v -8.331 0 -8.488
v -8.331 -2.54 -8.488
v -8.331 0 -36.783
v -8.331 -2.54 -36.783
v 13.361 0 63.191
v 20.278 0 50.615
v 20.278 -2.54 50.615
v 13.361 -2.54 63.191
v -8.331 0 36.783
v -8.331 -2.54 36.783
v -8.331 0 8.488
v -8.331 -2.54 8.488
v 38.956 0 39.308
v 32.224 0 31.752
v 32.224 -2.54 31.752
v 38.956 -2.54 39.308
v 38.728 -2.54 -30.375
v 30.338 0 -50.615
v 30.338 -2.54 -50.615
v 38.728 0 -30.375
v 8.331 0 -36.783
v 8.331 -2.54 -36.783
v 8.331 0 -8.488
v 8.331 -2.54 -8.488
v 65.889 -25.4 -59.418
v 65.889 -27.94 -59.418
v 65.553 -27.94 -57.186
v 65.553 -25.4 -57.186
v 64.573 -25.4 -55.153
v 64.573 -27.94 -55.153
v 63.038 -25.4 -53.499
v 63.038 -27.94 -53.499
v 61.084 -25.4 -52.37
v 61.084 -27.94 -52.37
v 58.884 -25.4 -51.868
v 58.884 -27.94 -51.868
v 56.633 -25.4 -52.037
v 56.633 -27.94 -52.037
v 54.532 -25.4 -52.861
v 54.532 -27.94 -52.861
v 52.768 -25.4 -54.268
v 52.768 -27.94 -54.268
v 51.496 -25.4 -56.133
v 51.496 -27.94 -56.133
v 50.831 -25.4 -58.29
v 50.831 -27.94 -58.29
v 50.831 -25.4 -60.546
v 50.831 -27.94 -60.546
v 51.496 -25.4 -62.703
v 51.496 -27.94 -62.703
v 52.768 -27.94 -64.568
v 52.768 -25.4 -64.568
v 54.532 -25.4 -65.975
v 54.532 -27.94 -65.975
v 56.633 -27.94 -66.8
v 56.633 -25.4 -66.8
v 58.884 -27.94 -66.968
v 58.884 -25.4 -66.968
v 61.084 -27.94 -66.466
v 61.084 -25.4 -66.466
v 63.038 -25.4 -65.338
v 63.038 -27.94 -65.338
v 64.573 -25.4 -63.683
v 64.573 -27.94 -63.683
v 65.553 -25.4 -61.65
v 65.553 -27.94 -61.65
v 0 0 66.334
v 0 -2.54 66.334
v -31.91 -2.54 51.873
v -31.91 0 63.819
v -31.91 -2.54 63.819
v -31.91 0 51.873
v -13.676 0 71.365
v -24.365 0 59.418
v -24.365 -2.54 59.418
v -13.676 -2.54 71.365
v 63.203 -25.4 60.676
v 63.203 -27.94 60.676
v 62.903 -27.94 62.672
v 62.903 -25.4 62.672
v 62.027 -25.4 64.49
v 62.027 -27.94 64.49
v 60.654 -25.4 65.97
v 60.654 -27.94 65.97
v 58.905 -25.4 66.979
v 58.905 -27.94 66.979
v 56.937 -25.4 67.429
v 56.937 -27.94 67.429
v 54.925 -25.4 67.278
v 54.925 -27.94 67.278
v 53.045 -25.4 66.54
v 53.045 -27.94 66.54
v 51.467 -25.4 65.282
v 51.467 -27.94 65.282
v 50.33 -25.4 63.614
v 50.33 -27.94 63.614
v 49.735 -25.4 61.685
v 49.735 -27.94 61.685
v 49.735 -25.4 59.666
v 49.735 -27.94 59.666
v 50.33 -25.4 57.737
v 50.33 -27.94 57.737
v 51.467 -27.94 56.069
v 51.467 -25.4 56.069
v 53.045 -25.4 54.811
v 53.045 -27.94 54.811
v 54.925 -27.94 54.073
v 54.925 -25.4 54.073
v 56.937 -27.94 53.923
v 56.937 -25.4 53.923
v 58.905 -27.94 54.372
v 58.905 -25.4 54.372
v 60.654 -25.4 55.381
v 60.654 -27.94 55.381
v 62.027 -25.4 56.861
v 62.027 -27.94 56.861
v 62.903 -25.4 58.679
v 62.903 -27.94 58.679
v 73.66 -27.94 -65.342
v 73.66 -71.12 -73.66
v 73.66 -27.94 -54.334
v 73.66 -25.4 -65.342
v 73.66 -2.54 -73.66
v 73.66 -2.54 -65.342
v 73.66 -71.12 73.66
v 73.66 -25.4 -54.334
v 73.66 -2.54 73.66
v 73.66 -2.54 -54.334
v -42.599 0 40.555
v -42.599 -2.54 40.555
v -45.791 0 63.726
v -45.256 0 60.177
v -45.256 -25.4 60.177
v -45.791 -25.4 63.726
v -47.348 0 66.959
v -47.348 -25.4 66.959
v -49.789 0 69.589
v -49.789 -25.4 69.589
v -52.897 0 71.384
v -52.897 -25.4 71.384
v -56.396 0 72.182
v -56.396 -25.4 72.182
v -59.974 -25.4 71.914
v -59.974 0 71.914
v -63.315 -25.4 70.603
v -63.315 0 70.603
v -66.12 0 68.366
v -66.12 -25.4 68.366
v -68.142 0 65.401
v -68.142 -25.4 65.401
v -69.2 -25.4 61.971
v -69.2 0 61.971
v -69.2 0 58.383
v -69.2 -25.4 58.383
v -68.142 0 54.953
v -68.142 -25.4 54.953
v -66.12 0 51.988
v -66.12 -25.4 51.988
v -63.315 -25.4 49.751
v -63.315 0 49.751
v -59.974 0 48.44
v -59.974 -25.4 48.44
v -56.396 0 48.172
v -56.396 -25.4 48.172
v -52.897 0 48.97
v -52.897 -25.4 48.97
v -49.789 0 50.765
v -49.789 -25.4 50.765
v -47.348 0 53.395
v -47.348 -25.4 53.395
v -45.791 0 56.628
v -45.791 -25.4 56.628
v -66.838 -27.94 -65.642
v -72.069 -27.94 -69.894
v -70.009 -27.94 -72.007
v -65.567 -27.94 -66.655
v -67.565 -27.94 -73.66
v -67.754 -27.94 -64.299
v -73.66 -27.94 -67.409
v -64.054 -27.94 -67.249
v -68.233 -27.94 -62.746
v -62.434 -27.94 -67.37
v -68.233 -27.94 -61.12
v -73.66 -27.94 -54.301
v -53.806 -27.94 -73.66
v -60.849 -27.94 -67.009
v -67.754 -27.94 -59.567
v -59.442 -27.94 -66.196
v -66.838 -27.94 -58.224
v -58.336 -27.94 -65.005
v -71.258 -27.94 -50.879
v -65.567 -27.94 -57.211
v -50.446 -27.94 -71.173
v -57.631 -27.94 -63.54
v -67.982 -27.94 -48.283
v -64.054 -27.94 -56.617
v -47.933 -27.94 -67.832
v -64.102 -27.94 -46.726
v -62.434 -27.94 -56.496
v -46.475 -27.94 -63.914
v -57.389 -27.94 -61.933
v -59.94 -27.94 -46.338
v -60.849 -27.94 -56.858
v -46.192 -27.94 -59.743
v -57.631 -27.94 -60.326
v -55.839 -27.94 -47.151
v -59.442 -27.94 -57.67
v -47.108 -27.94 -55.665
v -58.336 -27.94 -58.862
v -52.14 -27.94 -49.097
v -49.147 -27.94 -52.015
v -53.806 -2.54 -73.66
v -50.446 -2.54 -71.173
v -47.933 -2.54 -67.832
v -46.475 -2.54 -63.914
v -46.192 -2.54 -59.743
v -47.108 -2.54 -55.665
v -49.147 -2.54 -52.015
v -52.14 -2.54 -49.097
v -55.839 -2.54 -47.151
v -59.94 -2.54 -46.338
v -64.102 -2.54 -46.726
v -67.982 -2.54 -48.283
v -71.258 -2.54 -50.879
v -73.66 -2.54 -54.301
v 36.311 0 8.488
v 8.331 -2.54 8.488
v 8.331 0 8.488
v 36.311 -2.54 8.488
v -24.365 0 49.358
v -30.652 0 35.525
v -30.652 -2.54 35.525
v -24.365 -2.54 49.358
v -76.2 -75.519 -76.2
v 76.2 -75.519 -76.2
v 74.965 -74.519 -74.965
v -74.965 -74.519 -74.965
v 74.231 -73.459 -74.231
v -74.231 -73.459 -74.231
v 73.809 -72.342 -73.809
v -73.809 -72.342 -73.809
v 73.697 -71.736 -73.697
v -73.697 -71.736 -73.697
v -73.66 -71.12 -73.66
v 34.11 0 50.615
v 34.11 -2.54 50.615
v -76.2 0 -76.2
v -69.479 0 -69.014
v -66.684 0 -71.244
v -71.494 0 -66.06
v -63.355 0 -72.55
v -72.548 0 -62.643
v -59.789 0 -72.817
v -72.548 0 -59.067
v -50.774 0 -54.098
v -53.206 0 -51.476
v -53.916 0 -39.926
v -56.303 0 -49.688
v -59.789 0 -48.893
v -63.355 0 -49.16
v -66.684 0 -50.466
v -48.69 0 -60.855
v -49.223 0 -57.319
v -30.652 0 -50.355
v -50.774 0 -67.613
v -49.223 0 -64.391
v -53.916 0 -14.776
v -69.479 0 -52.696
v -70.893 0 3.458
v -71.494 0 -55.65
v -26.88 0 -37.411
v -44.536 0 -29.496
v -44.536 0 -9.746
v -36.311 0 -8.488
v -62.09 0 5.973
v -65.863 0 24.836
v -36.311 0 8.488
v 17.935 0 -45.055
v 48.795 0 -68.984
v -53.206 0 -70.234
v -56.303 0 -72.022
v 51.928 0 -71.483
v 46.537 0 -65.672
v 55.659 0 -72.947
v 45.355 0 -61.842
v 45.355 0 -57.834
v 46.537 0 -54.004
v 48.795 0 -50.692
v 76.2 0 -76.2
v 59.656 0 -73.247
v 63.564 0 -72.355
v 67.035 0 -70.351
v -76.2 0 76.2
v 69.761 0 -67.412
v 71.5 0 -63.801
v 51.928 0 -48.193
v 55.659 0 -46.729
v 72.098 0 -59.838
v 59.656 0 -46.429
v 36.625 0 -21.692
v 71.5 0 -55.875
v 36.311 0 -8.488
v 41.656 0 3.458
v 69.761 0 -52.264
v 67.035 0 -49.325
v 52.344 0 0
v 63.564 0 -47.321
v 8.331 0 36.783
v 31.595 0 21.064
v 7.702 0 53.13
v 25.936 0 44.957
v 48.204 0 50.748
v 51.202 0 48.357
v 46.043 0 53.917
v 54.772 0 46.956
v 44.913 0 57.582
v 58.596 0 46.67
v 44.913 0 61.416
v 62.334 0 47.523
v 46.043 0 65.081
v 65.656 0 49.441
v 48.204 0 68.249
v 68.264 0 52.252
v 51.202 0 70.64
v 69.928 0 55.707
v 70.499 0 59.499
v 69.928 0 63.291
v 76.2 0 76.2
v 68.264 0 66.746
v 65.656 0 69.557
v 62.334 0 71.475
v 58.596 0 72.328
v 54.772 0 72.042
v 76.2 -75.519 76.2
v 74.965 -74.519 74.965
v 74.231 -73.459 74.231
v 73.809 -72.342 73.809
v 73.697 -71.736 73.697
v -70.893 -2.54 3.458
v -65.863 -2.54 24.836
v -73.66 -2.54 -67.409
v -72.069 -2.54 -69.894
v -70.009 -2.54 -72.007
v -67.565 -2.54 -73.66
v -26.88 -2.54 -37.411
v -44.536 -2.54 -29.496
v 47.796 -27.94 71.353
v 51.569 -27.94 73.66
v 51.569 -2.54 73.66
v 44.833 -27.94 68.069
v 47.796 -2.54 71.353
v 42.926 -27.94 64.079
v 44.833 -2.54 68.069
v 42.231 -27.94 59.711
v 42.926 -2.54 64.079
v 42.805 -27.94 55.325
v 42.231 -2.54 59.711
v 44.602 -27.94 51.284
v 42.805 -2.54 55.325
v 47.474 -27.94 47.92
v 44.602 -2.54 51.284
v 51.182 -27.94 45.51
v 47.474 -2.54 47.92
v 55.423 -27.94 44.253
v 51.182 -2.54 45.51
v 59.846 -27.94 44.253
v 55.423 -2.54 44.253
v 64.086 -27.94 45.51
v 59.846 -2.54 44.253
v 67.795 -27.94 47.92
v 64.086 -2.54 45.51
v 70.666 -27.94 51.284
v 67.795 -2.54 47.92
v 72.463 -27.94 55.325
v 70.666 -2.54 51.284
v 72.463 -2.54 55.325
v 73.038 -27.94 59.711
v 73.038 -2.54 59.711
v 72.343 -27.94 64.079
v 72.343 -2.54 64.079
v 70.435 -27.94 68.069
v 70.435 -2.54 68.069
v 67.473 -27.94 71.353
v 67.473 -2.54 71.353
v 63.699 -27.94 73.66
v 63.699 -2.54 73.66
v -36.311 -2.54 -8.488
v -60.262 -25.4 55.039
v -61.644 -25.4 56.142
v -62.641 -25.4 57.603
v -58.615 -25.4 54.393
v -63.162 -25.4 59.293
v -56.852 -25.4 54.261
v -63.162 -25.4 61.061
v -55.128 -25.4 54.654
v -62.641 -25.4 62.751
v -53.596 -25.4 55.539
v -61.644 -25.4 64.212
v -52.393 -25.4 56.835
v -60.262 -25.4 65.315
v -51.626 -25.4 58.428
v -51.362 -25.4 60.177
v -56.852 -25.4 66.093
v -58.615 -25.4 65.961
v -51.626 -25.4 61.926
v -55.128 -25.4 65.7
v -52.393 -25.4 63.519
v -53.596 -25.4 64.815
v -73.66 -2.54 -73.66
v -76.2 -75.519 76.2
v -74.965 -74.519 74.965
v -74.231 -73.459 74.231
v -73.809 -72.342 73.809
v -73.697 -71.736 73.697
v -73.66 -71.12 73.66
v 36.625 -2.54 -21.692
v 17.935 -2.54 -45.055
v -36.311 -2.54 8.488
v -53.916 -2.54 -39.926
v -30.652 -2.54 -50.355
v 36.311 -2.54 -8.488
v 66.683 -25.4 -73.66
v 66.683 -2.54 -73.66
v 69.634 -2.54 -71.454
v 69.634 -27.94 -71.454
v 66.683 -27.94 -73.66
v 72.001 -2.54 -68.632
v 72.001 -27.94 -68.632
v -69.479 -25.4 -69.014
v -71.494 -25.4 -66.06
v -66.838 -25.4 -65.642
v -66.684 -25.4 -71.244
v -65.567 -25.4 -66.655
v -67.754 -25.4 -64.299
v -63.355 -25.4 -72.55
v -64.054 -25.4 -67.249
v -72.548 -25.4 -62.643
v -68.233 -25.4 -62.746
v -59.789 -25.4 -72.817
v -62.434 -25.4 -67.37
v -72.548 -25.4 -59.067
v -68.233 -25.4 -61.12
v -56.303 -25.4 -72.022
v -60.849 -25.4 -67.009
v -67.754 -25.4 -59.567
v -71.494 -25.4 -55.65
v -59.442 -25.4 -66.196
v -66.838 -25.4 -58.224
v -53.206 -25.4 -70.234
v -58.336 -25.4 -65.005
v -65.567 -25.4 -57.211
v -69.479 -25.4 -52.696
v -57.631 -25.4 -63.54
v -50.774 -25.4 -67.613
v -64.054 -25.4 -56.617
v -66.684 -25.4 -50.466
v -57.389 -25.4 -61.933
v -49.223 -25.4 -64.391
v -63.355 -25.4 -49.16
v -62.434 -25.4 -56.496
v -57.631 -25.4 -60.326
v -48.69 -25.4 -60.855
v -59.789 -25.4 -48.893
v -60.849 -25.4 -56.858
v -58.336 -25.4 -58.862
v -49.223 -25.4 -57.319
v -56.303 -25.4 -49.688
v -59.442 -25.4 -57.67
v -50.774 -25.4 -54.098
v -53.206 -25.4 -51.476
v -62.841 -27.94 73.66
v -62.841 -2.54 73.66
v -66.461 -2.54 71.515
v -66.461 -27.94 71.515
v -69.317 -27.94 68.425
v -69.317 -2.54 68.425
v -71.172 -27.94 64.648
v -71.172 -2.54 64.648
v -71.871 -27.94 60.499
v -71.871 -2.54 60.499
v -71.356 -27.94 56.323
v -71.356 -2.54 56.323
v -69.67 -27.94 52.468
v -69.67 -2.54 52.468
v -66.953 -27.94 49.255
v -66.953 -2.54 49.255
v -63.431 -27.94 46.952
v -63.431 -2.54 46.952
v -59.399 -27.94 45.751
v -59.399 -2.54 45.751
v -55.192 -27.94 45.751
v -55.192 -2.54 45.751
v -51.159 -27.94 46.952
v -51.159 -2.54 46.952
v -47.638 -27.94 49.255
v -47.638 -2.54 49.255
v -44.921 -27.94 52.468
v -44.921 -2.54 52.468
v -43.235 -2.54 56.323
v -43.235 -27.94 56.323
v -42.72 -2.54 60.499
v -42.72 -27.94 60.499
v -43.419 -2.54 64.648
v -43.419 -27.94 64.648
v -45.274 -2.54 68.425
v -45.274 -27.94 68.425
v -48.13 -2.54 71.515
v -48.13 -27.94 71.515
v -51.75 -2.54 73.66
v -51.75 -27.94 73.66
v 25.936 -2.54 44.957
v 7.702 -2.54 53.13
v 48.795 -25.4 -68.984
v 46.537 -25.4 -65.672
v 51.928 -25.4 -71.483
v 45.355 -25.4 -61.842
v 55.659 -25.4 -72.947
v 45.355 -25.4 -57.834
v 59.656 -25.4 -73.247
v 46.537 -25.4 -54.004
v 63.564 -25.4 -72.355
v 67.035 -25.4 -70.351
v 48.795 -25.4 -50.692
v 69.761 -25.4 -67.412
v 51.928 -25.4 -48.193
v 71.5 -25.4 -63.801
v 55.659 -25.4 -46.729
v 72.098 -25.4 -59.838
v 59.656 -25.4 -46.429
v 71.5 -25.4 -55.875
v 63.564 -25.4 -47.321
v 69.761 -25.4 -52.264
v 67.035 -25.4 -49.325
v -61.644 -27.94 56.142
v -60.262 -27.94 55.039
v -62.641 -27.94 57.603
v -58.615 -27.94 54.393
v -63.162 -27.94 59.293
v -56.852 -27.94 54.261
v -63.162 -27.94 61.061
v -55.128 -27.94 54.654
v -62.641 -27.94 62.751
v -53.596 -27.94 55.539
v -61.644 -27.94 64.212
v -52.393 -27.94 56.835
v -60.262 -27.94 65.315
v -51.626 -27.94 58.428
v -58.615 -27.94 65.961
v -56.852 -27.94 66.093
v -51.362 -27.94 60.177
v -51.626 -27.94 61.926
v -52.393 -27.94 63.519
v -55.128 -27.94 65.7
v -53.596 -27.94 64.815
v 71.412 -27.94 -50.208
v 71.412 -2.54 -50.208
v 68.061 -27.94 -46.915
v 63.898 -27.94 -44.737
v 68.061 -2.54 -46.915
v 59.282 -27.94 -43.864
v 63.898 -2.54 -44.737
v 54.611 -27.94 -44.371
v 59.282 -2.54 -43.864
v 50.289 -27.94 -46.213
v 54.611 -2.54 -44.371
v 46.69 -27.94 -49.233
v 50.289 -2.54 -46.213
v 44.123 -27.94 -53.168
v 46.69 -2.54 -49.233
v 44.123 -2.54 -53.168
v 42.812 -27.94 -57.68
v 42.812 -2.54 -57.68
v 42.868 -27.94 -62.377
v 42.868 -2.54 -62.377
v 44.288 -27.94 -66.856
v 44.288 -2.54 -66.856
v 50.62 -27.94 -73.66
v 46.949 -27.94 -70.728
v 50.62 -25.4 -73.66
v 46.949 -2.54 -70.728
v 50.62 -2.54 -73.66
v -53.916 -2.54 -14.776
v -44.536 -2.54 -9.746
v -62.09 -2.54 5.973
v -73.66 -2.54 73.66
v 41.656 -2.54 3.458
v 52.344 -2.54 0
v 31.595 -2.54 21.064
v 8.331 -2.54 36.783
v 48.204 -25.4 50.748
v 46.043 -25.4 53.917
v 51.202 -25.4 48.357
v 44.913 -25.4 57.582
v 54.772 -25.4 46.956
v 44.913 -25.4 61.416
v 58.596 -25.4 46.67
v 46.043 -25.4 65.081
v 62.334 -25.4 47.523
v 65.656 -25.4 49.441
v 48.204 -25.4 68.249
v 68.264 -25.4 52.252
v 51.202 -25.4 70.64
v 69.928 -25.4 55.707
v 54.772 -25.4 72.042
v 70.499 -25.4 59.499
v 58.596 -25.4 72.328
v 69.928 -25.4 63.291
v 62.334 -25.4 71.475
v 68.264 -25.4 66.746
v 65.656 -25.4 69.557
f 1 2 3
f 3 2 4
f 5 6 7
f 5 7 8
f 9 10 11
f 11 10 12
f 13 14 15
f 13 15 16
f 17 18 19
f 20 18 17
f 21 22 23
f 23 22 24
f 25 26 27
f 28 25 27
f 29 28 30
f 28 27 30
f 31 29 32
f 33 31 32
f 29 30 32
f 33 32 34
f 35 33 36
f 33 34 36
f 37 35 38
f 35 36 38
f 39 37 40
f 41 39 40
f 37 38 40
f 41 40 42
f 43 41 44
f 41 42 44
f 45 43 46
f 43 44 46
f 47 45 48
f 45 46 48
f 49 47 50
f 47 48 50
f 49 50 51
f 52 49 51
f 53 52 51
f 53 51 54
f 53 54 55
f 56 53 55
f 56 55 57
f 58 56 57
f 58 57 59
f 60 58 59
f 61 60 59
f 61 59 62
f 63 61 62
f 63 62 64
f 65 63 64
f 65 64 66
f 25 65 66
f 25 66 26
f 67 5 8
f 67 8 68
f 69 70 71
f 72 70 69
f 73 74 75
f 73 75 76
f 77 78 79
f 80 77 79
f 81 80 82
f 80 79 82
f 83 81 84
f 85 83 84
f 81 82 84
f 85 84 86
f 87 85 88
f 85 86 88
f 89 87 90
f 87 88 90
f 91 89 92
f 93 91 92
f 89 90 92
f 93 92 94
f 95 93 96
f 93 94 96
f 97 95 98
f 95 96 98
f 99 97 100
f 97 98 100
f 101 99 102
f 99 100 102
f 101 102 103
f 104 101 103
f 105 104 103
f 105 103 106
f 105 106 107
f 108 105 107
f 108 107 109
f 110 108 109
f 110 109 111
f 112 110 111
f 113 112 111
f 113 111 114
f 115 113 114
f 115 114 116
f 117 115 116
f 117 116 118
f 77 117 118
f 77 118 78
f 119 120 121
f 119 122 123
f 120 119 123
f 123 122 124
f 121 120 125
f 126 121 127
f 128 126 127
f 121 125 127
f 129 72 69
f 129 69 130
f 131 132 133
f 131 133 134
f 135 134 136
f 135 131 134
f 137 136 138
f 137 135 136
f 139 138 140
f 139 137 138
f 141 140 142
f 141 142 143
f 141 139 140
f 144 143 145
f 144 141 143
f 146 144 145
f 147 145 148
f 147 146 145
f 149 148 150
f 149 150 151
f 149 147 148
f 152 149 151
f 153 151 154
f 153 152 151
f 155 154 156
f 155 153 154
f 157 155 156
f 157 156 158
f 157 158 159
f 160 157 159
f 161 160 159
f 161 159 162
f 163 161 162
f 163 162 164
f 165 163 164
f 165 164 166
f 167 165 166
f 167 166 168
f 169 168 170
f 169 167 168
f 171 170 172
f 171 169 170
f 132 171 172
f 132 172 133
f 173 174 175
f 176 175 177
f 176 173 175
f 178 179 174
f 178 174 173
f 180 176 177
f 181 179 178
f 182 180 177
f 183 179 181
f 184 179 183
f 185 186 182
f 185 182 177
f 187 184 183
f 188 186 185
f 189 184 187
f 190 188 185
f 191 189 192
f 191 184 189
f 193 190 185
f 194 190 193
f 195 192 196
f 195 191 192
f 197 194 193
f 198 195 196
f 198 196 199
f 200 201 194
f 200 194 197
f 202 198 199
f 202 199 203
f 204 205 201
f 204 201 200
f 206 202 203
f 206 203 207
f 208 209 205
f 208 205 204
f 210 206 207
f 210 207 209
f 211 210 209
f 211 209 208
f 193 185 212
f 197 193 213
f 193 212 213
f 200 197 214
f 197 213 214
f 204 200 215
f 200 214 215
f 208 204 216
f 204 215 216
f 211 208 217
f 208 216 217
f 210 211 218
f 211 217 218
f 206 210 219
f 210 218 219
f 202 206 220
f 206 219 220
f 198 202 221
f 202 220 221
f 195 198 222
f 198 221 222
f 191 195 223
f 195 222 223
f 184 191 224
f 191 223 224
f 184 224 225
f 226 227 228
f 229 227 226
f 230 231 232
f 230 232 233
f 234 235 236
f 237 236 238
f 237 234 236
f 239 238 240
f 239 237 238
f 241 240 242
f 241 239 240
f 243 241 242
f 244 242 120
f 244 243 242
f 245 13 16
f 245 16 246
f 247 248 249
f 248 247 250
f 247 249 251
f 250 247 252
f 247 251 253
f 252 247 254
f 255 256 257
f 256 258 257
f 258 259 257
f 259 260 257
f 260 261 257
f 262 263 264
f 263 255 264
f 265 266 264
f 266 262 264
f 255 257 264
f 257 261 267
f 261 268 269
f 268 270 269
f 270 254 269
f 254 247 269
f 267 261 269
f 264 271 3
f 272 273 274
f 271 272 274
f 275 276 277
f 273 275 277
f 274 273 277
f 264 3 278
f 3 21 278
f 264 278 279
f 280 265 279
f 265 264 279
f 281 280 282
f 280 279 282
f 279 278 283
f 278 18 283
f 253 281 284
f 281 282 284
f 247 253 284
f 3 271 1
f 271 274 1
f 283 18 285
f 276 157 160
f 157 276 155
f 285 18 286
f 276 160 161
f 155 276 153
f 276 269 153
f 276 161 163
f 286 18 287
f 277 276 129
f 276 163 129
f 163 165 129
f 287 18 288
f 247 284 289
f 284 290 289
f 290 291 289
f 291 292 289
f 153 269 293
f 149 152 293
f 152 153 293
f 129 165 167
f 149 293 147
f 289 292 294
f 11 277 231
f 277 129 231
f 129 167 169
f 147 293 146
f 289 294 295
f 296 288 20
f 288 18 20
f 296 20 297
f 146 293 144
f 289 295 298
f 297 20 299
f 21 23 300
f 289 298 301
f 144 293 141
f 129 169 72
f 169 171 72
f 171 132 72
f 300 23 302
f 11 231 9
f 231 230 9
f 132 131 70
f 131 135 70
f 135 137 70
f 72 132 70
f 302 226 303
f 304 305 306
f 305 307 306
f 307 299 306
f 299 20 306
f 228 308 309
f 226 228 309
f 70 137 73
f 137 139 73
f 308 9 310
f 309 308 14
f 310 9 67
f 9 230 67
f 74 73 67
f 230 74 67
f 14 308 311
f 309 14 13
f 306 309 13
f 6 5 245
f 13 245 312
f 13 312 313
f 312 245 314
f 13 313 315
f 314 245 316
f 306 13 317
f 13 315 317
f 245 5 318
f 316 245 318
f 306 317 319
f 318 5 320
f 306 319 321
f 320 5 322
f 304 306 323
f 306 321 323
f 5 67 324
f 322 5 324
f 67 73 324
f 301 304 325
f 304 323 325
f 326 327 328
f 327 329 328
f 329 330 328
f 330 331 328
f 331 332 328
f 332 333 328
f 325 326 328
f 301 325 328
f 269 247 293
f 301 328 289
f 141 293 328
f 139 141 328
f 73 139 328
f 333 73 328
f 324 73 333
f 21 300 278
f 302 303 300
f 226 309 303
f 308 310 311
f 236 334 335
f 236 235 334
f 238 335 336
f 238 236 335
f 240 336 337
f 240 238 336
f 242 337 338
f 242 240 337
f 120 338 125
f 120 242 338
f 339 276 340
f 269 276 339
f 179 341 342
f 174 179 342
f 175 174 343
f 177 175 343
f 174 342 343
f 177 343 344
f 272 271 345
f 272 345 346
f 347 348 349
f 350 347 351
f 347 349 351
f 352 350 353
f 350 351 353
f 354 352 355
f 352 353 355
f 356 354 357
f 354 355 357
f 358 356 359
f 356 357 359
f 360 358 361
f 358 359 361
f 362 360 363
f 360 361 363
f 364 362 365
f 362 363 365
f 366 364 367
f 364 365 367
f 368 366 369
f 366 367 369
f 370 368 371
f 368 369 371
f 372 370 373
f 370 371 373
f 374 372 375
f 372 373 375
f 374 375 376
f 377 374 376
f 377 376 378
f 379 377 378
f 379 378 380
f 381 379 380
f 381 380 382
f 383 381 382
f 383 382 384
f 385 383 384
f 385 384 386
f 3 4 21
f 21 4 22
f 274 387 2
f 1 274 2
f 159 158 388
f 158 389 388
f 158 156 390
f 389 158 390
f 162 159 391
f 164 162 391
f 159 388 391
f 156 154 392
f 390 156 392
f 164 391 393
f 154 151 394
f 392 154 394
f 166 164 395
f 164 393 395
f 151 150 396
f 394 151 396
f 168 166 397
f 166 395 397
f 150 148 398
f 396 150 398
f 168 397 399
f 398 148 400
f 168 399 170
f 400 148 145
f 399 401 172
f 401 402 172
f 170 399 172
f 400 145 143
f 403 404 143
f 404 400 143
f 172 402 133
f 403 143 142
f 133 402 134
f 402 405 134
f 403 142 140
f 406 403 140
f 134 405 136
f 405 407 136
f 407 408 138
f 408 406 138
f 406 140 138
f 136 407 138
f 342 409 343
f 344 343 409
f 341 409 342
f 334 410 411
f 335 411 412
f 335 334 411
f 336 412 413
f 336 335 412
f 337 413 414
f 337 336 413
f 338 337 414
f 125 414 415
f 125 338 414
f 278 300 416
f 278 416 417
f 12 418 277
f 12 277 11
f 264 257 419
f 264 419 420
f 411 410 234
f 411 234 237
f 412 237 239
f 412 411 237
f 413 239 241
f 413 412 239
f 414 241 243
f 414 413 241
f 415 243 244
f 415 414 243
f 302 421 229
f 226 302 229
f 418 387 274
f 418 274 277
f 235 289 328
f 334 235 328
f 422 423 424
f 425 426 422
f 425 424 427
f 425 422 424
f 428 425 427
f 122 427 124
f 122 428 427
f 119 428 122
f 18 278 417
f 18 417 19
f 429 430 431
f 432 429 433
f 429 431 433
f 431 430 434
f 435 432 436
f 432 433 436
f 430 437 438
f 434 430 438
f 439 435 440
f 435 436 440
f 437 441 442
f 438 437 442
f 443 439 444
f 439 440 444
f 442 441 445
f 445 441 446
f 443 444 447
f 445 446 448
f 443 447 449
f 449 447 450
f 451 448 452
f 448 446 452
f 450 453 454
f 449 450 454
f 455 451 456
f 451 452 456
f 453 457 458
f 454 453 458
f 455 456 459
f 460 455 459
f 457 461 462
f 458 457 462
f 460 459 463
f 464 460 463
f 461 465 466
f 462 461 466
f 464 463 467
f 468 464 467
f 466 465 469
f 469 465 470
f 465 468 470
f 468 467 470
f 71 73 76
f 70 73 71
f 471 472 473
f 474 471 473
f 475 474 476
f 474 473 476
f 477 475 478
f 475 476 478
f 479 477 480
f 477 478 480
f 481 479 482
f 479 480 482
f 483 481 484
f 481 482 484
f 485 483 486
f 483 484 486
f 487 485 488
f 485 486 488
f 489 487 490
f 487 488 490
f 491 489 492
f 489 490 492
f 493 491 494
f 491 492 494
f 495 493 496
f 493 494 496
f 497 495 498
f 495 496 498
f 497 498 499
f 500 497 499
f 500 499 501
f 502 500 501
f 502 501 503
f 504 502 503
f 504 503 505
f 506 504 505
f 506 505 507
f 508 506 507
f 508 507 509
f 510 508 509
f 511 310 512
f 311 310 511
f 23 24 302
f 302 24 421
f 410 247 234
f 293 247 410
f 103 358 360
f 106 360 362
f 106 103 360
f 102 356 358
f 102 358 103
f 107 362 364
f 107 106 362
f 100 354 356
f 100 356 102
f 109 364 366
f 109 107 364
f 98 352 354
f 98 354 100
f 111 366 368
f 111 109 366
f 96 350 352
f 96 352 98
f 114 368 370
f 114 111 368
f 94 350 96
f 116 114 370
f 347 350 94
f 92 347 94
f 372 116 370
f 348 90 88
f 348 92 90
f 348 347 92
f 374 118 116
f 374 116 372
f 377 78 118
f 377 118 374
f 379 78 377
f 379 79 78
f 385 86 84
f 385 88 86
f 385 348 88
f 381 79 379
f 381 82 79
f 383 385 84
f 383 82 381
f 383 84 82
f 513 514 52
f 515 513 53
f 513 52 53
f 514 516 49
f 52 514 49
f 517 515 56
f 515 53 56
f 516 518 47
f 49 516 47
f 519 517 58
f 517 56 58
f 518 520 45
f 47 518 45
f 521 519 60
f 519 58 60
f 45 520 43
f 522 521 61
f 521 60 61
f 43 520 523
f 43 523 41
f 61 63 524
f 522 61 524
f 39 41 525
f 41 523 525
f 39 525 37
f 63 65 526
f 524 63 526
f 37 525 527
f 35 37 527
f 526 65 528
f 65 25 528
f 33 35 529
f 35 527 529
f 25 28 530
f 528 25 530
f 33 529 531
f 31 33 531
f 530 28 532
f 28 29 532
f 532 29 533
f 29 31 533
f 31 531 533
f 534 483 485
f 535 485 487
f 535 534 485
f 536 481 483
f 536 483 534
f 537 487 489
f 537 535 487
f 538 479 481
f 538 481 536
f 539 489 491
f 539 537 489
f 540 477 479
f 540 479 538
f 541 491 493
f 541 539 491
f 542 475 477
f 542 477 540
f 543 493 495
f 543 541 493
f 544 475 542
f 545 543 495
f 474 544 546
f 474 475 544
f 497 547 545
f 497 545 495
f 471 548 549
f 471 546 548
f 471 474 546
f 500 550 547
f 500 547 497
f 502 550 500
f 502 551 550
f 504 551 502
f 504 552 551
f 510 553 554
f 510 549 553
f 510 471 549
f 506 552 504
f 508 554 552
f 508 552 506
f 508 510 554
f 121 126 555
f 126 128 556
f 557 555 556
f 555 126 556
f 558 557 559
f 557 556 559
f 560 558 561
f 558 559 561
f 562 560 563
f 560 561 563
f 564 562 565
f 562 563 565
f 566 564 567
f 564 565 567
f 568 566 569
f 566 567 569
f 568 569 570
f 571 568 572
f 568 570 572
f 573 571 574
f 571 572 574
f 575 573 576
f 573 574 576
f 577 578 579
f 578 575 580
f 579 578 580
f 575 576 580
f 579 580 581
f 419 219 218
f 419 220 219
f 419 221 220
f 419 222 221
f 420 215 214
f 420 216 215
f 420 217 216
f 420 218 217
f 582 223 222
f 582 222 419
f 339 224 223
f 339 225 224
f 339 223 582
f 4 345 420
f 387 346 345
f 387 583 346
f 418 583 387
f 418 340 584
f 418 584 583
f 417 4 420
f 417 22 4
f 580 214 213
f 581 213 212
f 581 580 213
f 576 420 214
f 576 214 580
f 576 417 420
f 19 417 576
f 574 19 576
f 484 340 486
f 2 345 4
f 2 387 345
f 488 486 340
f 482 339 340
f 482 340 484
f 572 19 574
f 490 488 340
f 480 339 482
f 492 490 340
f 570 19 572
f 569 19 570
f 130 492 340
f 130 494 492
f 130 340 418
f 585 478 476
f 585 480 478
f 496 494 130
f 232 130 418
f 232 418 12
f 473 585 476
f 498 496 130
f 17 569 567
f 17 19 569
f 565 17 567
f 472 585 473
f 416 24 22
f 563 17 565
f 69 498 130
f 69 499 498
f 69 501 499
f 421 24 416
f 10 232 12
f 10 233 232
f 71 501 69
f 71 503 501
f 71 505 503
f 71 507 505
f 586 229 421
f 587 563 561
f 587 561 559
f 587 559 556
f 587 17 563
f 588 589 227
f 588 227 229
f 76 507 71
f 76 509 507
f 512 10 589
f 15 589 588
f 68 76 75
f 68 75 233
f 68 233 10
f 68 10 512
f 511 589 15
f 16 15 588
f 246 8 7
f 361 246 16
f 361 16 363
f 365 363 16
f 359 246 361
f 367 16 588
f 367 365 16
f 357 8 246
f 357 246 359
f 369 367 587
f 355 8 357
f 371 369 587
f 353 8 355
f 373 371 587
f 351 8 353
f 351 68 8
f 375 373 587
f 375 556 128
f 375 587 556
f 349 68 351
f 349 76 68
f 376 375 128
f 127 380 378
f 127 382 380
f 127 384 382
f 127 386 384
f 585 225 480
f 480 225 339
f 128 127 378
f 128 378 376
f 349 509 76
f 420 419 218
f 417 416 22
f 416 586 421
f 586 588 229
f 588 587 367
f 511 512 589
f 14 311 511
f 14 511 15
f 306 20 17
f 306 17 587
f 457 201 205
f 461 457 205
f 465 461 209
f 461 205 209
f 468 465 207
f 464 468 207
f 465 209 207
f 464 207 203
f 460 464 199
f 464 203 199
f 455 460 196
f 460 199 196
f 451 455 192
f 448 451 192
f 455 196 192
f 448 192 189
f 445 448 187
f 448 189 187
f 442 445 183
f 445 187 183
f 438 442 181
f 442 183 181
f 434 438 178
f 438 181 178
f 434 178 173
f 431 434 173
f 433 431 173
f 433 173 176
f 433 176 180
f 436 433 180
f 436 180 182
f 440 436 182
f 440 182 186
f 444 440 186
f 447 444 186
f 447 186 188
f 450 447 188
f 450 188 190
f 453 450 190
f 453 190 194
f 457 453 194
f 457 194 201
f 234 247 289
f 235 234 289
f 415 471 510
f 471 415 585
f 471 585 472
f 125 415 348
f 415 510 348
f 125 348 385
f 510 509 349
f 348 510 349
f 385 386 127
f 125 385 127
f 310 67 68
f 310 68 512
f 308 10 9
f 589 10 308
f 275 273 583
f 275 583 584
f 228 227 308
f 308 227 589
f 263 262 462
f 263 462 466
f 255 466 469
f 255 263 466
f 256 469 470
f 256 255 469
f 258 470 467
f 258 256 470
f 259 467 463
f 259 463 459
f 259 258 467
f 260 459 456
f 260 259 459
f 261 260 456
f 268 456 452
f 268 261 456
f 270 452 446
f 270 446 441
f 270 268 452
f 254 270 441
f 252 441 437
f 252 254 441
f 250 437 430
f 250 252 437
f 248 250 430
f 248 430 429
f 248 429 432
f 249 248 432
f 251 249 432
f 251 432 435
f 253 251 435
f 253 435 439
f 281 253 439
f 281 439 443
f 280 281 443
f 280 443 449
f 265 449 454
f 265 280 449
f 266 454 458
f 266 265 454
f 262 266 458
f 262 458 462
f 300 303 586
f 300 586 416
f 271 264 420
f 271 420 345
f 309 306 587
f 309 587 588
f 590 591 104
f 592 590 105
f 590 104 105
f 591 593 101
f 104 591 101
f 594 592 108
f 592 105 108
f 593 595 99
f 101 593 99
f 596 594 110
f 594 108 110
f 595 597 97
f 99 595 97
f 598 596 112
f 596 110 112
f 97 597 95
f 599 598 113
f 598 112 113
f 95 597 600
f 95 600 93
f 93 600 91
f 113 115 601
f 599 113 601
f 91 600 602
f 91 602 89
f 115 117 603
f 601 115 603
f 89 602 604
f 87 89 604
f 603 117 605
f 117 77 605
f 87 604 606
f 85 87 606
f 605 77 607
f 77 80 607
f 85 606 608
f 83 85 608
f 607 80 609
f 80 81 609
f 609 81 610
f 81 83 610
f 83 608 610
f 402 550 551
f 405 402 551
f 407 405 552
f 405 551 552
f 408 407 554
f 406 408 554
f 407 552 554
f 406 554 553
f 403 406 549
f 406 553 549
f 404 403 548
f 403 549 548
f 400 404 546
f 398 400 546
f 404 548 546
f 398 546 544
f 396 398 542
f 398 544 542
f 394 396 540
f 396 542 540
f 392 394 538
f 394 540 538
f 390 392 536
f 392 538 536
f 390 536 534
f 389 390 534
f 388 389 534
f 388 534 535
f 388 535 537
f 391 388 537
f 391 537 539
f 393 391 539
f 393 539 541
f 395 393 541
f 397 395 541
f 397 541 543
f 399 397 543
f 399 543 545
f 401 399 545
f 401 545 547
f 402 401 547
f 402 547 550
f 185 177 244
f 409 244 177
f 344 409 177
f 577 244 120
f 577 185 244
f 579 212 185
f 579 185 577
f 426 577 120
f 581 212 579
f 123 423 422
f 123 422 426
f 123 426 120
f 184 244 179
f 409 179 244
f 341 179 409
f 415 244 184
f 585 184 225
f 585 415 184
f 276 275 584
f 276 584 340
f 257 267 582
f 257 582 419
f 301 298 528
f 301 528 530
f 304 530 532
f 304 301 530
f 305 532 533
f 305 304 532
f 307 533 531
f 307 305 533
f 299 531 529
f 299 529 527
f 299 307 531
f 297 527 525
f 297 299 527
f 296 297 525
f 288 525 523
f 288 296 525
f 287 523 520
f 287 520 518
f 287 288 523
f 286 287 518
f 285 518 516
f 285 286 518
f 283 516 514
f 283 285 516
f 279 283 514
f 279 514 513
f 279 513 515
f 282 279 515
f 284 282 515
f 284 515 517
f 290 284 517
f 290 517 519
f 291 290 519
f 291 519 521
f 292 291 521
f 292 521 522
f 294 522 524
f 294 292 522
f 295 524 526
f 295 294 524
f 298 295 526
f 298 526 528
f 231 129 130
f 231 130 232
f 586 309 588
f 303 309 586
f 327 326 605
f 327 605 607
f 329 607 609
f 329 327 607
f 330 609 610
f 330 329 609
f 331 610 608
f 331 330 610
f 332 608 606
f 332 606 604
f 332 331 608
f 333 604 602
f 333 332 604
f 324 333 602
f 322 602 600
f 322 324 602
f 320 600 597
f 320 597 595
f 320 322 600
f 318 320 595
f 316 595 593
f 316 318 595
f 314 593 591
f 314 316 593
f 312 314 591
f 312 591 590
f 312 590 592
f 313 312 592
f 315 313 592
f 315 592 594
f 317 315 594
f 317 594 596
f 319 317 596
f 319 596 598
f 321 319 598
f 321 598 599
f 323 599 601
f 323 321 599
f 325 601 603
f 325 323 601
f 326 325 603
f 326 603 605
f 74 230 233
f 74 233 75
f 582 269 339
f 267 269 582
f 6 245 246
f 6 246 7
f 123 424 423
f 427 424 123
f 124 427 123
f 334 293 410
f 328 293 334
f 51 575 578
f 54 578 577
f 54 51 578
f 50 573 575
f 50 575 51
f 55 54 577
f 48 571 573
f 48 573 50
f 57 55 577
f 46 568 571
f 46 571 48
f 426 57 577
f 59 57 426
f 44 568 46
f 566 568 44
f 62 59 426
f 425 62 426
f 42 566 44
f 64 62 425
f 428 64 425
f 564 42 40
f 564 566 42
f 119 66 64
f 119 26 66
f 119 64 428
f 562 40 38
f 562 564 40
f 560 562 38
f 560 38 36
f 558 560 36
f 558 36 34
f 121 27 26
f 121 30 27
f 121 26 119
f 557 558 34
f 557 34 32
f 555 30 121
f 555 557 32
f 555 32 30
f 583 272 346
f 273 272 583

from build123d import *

# Parameters (mm, degrees)
F0_W         = 152.4
F0_H         = 152.4
F1_DEPTH     = 76.2
F2_R         = 12.8651099241
F2_R_2       = 12.0389782125
F2_R_3       = 13.4461105648
F2_R_4       = 11.9959461494
F3_DEPTH     = 25.4
F4_T         = 2.54
F5_T1_DEPTH  = 147.32
F5_T3_DEPTH  = 147.32
F5_T9_DEPTH  = 160.02
F5_T15_DEPTH = 160.02
F5_T24_DEPTH = 160.02
F5_T30_DEPTH = 160.02
F5_T39_DEPTH = 160.02
F5_T45_DEPTH = 160.02
F5_T54_DEPTH = 160.02
F5_T60_DEPTH = 160.02
F6_W         = 16.6622009128
F6_H         = 28.2943053171
F6_H_2       = 16.9765818864
F6_W_2       = 27.9799224809
F7_DEPTH     = 25.4
F8_R         = 5.4524649891
F8_R_2       = 5.9328095345
F8_R_3       = 6.7719768786
F8_R_4       = 7.5712998573
F9_DEPTH     = 25.4
F11_DEPTH    = 25.4


# Not quite as in the source:
# - a fillet or chamfer that OpenCascade refuses, or shapes differently, is made with other operations: its cross-section is extruded or revolved along the edge and cut away or added
# - a shell that OpenCascade refuses in one call is made with other operations: the cavity is built on its own and cut out


with BuildPart() as f1:
    # F0 (on Front) → F1 (new body)
    with BuildSketch(Plane.XZ):
        Rectangle(F0_W, F0_H)
    extrude(amount=F1_DEPTH)

    # F2 (on face) → F3 (cut)
    with BuildSketch(Plane.XZ):
        with Locations((57.6343238354, 59.4989620149)):
            Circle(F2_R)
        with Locations((-57.2953000665, 60.177013278)):
            Circle(F2_R_2)
        with Locations((58.6513988674, -59.8379895091)):
            Circle(F2_R_3)
        with Locations((-60.6855526567, -60.8550645411)):
            Circle(F2_R_4)
    extrude(amount=F3_DEPTH, mode=Mode.SUBTRACT)

    # F4: shell of thickness 2.54, made by hand


with BuildPart() as f4_core1:
    # F4_t2: copy of F1
    add(f1.part)

    # the walls: a layer under each face that stays
    f4_faces = [f4_core1.faces().sort_by_distance(p)[0] for p in [
        (0, -38.1, 76.2),
        (76.2, -38.1, 0),
        (-76.2, -38.1, 0),
        (0, 0, 0),
        (0, -38.1, -76.2),
        (-72.681498806, -12.7, -60.8550645411),
        (45.2052883026, -12.7, -59.8379895091),
        (-69.334278279, -12.7, 60.177013278),
        (44.7692139113, -12.7, 59.4989620149),
        (-60.6855526567, -25.4, -60.8550645411),
        (58.6513988674, -25.4, -59.8379895091),
        (-57.2953000665, -25.4, 60.177013278),
        (57.6343238354, -25.4, 59.4989620149),
    ]]
    thicken(f4_faces, amount=-F4_T, mode=Mode.SUBTRACT)

    # F4_s3 → F4_t4 (revolve, cut)
    with BuildSketch(Plane.XY.offset(-60.8550645411)):
        Polygon((-48.7150065073, -25.3746), (-46.1496065073, -25.4), (-46.1496065073, -27.94), (-48.6896065073, -27.94), align=None)
    revolve(axis=Axis((-60.6855526567, -25.4, -60.8550645411), (0, -1, 0)), mode=Mode.SUBTRACT)

    # F4_s5 → F4_t6 (revolve, cut)
    with BuildSketch(Plane.XY.offset(-59.8379895091)):
        Polygon((72.0721094321, -25.3746), (74.6375094321, -25.4), (74.6375094321, -27.94), (72.0975094321, -27.94), align=None)
    revolve(axis=Axis((58.6513988674, -25.4, -59.8379895091), (0, -1, 0)), mode=Mode.SUBTRACT)

    # F4_s7 → F4_t8 (revolve, cut)
    with BuildSketch(Plane.XY.offset(60.177013278)):
        Polygon((-45.281721854, -25.3746), (-42.716321854, -25.4), (-42.716321854, -27.94), (-45.256321854, -27.94), align=None)
    revolve(axis=Axis((-57.2953000665, -25.4, 60.177013278), (0, -1, 0)), mode=Mode.SUBTRACT)

    # F4_s9 → F4_t10 (revolve, cut)
    with BuildSketch(Plane.XY.offset(59.4989620149)):
        Polygon((70.4740337595, -25.3746), (73.0394337595, -25.4), (73.0394337595, -27.94), (70.4994337595, -27.94), align=None)
    revolve(axis=Axis((57.6343238354, -25.4, 59.4989620149), (0, -1, 0)), mode=Mode.SUBTRACT)


with BuildPart() as f1_1:
    add(f1.part)

    # what is left inside the walls is the cavity
    f4_cavity = [f4_core1.part.solids().sort_by_distance(p)[0] for p in [
        (0, -76.1746, -24.553333),
    ]]
    add(f4_cavity, mode=Mode.SUBTRACT)

    # F5: fillet of radius 5.08 on 4 edges, made by hand

    # F5_s2 → F5_t1 (cut)
    with BuildSketch(Plane.YZ.offset(-73.66)):
        with BuildLine():
            ThreePointArc((-76.2, 78.74), (-74.7121024484, 75.1478975516), (-71.12, 73.66))
            Line((-71.12, 73.66), (-76.2, 73.66))
            Line((-76.2, 73.66), (-76.2, 78.74))
        make_face()
        with BuildLine():
            ThreePointArc((-76.2, -78.74), (-74.7121024484, -75.1478975516), (-71.12, -73.66))
            Line((-71.12, -73.66), (-76.2, -73.66))
            Line((-76.2, -73.66), (-76.2, -78.74))
        make_face()
    extrude(amount=F5_T1_DEPTH, mode=Mode.SUBTRACT)

    # F5_s4 → F5_t3 (cut)
    with BuildSketch(Plane.XY.offset(-73.66)):
        with BuildLine():
            ThreePointArc((-78.74, -76.2), (-75.1478975516, -74.7121024484), (-73.66, -71.12))
            Line((-73.66, -71.12), (-73.66, -76.2))
            Line((-73.66, -76.2), (-78.74, -76.2))
        make_face()
        with BuildLine():
            ThreePointArc((78.74, -76.2), (75.1478975516, -74.7121024484), (73.66, -71.12))
            Line((73.66, -71.12), (73.66, -76.2))
            Line((73.66, -76.2), (78.74, -76.2))
        make_face()
    extrude(amount=F5_T3_DEPTH, mode=Mode.SUBTRACT)


with BuildPart() as f5_tool7:
    # F5_s8 → F5_t9 (new body)
    with BuildSketch(Plane.YZ.offset(86.36)):
        with BuildLine():
            ThreePointArc((-76.2, 78.74), (-74.7121024484, 75.1478975516), (-71.12, 73.66))
            Line((-71.12, 73.66), (-76.2, 73.66))
            Line((-76.2, 73.66), (-76.2, 78.74))
        make_face()
    extrude(amount=-F5_T9_DEPTH)

    split(bisect_by=Plane.XY.offset(76.2), keep=Keep.BOTTOM)

    split(bisect_by=Plane.YZ.offset(76.2), keep=Keep.BOTTOM)

    split(bisect_by=Plane.YZ.offset(73.66), keep=Keep.TOP)


with BuildPart() as f5_tool13:
    # F5_s14 → F5_t15 (new body)
    with BuildSketch(Plane.XY.offset(-73.66)):
        with BuildLine():
            ThreePointArc((78.74, -76.2), (75.1478975516, -74.7121024484), (73.66, -71.12))
            Line((73.66, -71.12), (73.66, -76.2))
            Line((73.66, -76.2), (78.74, -76.2))
        make_face()
    extrude(amount=F5_T15_DEPTH)

    split(bisect_by=Plane.XY.offset(76.2), keep=Keep.BOTTOM)

    split(bisect_by=Plane.YZ.offset(76.2), keep=Keep.BOTTOM)

    split(bisect_by=Plane.XY.offset(73.66), keep=Keep.TOP)


with BuildPart() as f5_tool7_1:
    add(f5_tool7.part)

    # F5_t19: intersect F5_tool13
    add(f5_tool13.part, mode=Mode.INTERSECT)


with BuildPart() as f1_2:
    add(f1_1.part)

    # F5_t5: cut F5_tool7
    add(f5_tool7_1.part, mode=Mode.SUBTRACT)


with BuildPart() as f5_tool22:
    # F5_s23 → F5_t24 (new body)
    with BuildSketch(Plane.YZ.offset(73.66)):
        with BuildLine():
            ThreePointArc((-76.2, 78.74), (-74.7121024484, 75.1478975516), (-71.12, 73.66))
            Line((-71.12, 73.66), (-76.2, 73.66))
            Line((-76.2, 73.66), (-76.2, 78.74))
        make_face()
    extrude(amount=-F5_T24_DEPTH)

    split(bisect_by=Plane.XY.offset(76.2), keep=Keep.BOTTOM)

    split(bisect_by=Plane.YZ.offset(-76.2), keep=Keep.TOP)

    split(bisect_by=Plane.YZ.offset(-73.66), keep=Keep.BOTTOM)


with BuildPart() as f5_tool28:
    # F5_s29 → F5_t30 (new body)
    with BuildSketch(Plane.XY.offset(86.36)):
        with BuildLine():
            ThreePointArc((-78.74, -76.2), (-75.1478975516, -74.7121024484), (-73.66, -71.12))
            Line((-73.66, -71.12), (-73.66, -76.2))
            Line((-73.66, -76.2), (-78.74, -76.2))
        make_face()
    extrude(amount=-F5_T30_DEPTH)

    split(bisect_by=Plane.XY.offset(76.2), keep=Keep.BOTTOM)

    split(bisect_by=Plane.YZ.offset(-76.2), keep=Keep.TOP)

    split(bisect_by=Plane.XY.offset(73.66), keep=Keep.TOP)


with BuildPart() as f5_tool22_1:
    add(f5_tool22.part)

    # F5_t34: intersect F5_tool28
    add(f5_tool28.part, mode=Mode.INTERSECT)


with BuildPart() as f1_3:
    add(f1_2.part)

    # F5_t20: cut F5_tool22
    add(f5_tool22_1.part, mode=Mode.SUBTRACT)


with BuildPart() as f5_tool37:
    # F5_s38 → F5_t39 (new body)
    with BuildSketch(Plane.XY.offset(73.66)):
        with BuildLine():
            ThreePointArc((-78.74, -76.2), (-75.1478975516, -74.7121024484), (-73.66, -71.12))
            Line((-73.66, -71.12), (-73.66, -76.2))
            Line((-73.66, -76.2), (-78.74, -76.2))
        make_face()
    extrude(amount=-F5_T39_DEPTH)

    split(bisect_by=Plane.YZ.offset(-76.2), keep=Keep.TOP)

    split(bisect_by=Plane.XY.offset(-76.2), keep=Keep.TOP)

    split(bisect_by=Plane.XY.offset(-73.66), keep=Keep.BOTTOM)


with BuildPart() as f5_tool43:
    # F5_s44 → F5_t45 (new body)
    with BuildSketch(Plane.YZ.offset(-86.36)):
        with BuildLine():
            ThreePointArc((-76.2, -78.74), (-74.7121024484, -75.1478975516), (-71.12, -73.66))
            Line((-71.12, -73.66), (-76.2, -73.66))
            Line((-76.2, -73.66), (-76.2, -78.74))
        make_face()
    extrude(amount=F5_T45_DEPTH)

    split(bisect_by=Plane.YZ.offset(-76.2), keep=Keep.TOP)

    split(bisect_by=Plane.XY.offset(-76.2), keep=Keep.TOP)

    split(bisect_by=Plane.YZ.offset(-73.66), keep=Keep.BOTTOM)


with BuildPart() as f5_tool37_1:
    add(f5_tool37.part)

    # F5_t49: intersect F5_tool43
    add(f5_tool43.part, mode=Mode.INTERSECT)


with BuildPart() as f1_4:
    add(f1_3.part)

    # F5_t35: cut F5_tool37
    add(f5_tool37_1.part, mode=Mode.SUBTRACT)


with BuildPart() as f5_tool52:
    # F5_s53 → F5_t54 (new body)
    with BuildSketch(Plane.YZ.offset(-73.66)):
        with BuildLine():
            ThreePointArc((-76.2, -78.74), (-74.7121024484, -75.1478975516), (-71.12, -73.66))
            Line((-71.12, -73.66), (-76.2, -73.66))
            Line((-76.2, -73.66), (-76.2, -78.74))
        make_face()
    extrude(amount=F5_T54_DEPTH)

    split(bisect_by=Plane.YZ.offset(76.2), keep=Keep.BOTTOM)

    split(bisect_by=Plane.XY.offset(-76.2), keep=Keep.TOP)

    split(bisect_by=Plane.YZ.offset(73.66), keep=Keep.TOP)


with BuildPart() as f5_tool58:
    # F5_s59 → F5_t60 (new body)
    with BuildSketch(Plane.XY.offset(-86.36)):
        with BuildLine():
            ThreePointArc((78.74, -76.2), (75.1478975516, -74.7121024484), (73.66, -71.12))
            Line((73.66, -71.12), (73.66, -76.2))
            Line((73.66, -76.2), (78.74, -76.2))
        make_face()
    extrude(amount=F5_T60_DEPTH)

    split(bisect_by=Plane.YZ.offset(76.2), keep=Keep.BOTTOM)

    split(bisect_by=Plane.XY.offset(-76.2), keep=Keep.TOP)

    split(bisect_by=Plane.XY.offset(-73.66), keep=Keep.BOTTOM)


with BuildPart() as f5_tool52_1:
    add(f5_tool52.part)

    # F5_t64: intersect F5_tool58
    add(f5_tool58.part, mode=Mode.INTERSECT)


with BuildPart() as f1_5:
    add(f1_4.part)

    # F5_t50: cut F5_tool52
    add(f5_tool52_1.part, mode=Mode.SUBTRACT)

    # F6 (on face) → F7 (cut)
    with BuildSketch(Plane.XZ.offset(2.54)):
        with Locations((0, 22.6354436018)):
            Rectangle(F6_W, F6_H)
        Rectangle(F6_W, F6_H_2)
        with Locations((0, -22.6354436018)):
            Rectangle(F6_W, F6_H)
        with Locations((22.3210616969, 0)):
            Rectangle(F6_W_2, F6_H_2)
        with Locations((-22.3210616969, 0)):
            Rectangle(F6_W_2, F6_H_2)
    extrude(amount=-F7_DEPTH, mode=Mode.SUBTRACT)

    # F8 (on face) → F9 (cut)
    with BuildSketch(Plane.XZ.offset(27.94)):
        with Locations((-62.8410799733, -61.9330853224)):
            Circle(F8_R)
        with Locations((-57.2953000665, 60.177013278)):
            Circle(F8_R_2)
        with Locations((56.4314164221, 60.6755614281)):
            Circle(F8_R_3)
        with Locations((58.3177022636, -59.4180375338)):
            Circle(F8_R_4)
    extrude(amount=-F9_DEPTH, mode=Mode.SUBTRACT)

    # F10 (on face) → F11 (cut)
    with BuildSketch(Plane.XZ):
        Polygon((17.9349766593, -45.055488267), (30.337780714, -50.615362823), (38.728027374, -30.3751360907), (52.3444600403, 0), (31.5953046083, 21.0635364056), (41.6555032134, 3.458192572), (36.6254039109, -21.6922983527), align=None)
        Polygon((-30.652159825, -50.3551833958), (-26.879588142, -37.4113582075), (-44.5359825398, -29.4964272347), (-44.5359825398, -9.7458148375), (-62.0902739465, 5.9732417576), (-65.8628493547, 24.8361118138), (-70.892944932, 3.458192572), (-53.9163686335, -14.7759132087), (-53.9163686335, -39.9264059961), align=None)
        Polygon((-42.5986461341, 40.5551679432), (-30.652159825, 35.5250686407), (-24.3645366281, 49.3578389287), (-24.3645366281, 59.4180375338), (-13.6755788699, 71.3645219803), (-31.9096893072, 63.8193711638), (-31.9096893072, 51.8728867173), align=None)
        Polygon((32.2240665555, 31.7524932325), (38.9561592304, 39.308484465), (34.110352397, 50.615362823), (20.2775839716, 50.615362823), (13.3611978963, 63.1906092167), (0, 66.334426403), (7.7023385093, 53.1304106116), (25.9364452213, 44.9565052986), align=None)
    extrude(amount=F11_DEPTH, mode=Mode.SUBTRACT)


solid = f1_5.part
